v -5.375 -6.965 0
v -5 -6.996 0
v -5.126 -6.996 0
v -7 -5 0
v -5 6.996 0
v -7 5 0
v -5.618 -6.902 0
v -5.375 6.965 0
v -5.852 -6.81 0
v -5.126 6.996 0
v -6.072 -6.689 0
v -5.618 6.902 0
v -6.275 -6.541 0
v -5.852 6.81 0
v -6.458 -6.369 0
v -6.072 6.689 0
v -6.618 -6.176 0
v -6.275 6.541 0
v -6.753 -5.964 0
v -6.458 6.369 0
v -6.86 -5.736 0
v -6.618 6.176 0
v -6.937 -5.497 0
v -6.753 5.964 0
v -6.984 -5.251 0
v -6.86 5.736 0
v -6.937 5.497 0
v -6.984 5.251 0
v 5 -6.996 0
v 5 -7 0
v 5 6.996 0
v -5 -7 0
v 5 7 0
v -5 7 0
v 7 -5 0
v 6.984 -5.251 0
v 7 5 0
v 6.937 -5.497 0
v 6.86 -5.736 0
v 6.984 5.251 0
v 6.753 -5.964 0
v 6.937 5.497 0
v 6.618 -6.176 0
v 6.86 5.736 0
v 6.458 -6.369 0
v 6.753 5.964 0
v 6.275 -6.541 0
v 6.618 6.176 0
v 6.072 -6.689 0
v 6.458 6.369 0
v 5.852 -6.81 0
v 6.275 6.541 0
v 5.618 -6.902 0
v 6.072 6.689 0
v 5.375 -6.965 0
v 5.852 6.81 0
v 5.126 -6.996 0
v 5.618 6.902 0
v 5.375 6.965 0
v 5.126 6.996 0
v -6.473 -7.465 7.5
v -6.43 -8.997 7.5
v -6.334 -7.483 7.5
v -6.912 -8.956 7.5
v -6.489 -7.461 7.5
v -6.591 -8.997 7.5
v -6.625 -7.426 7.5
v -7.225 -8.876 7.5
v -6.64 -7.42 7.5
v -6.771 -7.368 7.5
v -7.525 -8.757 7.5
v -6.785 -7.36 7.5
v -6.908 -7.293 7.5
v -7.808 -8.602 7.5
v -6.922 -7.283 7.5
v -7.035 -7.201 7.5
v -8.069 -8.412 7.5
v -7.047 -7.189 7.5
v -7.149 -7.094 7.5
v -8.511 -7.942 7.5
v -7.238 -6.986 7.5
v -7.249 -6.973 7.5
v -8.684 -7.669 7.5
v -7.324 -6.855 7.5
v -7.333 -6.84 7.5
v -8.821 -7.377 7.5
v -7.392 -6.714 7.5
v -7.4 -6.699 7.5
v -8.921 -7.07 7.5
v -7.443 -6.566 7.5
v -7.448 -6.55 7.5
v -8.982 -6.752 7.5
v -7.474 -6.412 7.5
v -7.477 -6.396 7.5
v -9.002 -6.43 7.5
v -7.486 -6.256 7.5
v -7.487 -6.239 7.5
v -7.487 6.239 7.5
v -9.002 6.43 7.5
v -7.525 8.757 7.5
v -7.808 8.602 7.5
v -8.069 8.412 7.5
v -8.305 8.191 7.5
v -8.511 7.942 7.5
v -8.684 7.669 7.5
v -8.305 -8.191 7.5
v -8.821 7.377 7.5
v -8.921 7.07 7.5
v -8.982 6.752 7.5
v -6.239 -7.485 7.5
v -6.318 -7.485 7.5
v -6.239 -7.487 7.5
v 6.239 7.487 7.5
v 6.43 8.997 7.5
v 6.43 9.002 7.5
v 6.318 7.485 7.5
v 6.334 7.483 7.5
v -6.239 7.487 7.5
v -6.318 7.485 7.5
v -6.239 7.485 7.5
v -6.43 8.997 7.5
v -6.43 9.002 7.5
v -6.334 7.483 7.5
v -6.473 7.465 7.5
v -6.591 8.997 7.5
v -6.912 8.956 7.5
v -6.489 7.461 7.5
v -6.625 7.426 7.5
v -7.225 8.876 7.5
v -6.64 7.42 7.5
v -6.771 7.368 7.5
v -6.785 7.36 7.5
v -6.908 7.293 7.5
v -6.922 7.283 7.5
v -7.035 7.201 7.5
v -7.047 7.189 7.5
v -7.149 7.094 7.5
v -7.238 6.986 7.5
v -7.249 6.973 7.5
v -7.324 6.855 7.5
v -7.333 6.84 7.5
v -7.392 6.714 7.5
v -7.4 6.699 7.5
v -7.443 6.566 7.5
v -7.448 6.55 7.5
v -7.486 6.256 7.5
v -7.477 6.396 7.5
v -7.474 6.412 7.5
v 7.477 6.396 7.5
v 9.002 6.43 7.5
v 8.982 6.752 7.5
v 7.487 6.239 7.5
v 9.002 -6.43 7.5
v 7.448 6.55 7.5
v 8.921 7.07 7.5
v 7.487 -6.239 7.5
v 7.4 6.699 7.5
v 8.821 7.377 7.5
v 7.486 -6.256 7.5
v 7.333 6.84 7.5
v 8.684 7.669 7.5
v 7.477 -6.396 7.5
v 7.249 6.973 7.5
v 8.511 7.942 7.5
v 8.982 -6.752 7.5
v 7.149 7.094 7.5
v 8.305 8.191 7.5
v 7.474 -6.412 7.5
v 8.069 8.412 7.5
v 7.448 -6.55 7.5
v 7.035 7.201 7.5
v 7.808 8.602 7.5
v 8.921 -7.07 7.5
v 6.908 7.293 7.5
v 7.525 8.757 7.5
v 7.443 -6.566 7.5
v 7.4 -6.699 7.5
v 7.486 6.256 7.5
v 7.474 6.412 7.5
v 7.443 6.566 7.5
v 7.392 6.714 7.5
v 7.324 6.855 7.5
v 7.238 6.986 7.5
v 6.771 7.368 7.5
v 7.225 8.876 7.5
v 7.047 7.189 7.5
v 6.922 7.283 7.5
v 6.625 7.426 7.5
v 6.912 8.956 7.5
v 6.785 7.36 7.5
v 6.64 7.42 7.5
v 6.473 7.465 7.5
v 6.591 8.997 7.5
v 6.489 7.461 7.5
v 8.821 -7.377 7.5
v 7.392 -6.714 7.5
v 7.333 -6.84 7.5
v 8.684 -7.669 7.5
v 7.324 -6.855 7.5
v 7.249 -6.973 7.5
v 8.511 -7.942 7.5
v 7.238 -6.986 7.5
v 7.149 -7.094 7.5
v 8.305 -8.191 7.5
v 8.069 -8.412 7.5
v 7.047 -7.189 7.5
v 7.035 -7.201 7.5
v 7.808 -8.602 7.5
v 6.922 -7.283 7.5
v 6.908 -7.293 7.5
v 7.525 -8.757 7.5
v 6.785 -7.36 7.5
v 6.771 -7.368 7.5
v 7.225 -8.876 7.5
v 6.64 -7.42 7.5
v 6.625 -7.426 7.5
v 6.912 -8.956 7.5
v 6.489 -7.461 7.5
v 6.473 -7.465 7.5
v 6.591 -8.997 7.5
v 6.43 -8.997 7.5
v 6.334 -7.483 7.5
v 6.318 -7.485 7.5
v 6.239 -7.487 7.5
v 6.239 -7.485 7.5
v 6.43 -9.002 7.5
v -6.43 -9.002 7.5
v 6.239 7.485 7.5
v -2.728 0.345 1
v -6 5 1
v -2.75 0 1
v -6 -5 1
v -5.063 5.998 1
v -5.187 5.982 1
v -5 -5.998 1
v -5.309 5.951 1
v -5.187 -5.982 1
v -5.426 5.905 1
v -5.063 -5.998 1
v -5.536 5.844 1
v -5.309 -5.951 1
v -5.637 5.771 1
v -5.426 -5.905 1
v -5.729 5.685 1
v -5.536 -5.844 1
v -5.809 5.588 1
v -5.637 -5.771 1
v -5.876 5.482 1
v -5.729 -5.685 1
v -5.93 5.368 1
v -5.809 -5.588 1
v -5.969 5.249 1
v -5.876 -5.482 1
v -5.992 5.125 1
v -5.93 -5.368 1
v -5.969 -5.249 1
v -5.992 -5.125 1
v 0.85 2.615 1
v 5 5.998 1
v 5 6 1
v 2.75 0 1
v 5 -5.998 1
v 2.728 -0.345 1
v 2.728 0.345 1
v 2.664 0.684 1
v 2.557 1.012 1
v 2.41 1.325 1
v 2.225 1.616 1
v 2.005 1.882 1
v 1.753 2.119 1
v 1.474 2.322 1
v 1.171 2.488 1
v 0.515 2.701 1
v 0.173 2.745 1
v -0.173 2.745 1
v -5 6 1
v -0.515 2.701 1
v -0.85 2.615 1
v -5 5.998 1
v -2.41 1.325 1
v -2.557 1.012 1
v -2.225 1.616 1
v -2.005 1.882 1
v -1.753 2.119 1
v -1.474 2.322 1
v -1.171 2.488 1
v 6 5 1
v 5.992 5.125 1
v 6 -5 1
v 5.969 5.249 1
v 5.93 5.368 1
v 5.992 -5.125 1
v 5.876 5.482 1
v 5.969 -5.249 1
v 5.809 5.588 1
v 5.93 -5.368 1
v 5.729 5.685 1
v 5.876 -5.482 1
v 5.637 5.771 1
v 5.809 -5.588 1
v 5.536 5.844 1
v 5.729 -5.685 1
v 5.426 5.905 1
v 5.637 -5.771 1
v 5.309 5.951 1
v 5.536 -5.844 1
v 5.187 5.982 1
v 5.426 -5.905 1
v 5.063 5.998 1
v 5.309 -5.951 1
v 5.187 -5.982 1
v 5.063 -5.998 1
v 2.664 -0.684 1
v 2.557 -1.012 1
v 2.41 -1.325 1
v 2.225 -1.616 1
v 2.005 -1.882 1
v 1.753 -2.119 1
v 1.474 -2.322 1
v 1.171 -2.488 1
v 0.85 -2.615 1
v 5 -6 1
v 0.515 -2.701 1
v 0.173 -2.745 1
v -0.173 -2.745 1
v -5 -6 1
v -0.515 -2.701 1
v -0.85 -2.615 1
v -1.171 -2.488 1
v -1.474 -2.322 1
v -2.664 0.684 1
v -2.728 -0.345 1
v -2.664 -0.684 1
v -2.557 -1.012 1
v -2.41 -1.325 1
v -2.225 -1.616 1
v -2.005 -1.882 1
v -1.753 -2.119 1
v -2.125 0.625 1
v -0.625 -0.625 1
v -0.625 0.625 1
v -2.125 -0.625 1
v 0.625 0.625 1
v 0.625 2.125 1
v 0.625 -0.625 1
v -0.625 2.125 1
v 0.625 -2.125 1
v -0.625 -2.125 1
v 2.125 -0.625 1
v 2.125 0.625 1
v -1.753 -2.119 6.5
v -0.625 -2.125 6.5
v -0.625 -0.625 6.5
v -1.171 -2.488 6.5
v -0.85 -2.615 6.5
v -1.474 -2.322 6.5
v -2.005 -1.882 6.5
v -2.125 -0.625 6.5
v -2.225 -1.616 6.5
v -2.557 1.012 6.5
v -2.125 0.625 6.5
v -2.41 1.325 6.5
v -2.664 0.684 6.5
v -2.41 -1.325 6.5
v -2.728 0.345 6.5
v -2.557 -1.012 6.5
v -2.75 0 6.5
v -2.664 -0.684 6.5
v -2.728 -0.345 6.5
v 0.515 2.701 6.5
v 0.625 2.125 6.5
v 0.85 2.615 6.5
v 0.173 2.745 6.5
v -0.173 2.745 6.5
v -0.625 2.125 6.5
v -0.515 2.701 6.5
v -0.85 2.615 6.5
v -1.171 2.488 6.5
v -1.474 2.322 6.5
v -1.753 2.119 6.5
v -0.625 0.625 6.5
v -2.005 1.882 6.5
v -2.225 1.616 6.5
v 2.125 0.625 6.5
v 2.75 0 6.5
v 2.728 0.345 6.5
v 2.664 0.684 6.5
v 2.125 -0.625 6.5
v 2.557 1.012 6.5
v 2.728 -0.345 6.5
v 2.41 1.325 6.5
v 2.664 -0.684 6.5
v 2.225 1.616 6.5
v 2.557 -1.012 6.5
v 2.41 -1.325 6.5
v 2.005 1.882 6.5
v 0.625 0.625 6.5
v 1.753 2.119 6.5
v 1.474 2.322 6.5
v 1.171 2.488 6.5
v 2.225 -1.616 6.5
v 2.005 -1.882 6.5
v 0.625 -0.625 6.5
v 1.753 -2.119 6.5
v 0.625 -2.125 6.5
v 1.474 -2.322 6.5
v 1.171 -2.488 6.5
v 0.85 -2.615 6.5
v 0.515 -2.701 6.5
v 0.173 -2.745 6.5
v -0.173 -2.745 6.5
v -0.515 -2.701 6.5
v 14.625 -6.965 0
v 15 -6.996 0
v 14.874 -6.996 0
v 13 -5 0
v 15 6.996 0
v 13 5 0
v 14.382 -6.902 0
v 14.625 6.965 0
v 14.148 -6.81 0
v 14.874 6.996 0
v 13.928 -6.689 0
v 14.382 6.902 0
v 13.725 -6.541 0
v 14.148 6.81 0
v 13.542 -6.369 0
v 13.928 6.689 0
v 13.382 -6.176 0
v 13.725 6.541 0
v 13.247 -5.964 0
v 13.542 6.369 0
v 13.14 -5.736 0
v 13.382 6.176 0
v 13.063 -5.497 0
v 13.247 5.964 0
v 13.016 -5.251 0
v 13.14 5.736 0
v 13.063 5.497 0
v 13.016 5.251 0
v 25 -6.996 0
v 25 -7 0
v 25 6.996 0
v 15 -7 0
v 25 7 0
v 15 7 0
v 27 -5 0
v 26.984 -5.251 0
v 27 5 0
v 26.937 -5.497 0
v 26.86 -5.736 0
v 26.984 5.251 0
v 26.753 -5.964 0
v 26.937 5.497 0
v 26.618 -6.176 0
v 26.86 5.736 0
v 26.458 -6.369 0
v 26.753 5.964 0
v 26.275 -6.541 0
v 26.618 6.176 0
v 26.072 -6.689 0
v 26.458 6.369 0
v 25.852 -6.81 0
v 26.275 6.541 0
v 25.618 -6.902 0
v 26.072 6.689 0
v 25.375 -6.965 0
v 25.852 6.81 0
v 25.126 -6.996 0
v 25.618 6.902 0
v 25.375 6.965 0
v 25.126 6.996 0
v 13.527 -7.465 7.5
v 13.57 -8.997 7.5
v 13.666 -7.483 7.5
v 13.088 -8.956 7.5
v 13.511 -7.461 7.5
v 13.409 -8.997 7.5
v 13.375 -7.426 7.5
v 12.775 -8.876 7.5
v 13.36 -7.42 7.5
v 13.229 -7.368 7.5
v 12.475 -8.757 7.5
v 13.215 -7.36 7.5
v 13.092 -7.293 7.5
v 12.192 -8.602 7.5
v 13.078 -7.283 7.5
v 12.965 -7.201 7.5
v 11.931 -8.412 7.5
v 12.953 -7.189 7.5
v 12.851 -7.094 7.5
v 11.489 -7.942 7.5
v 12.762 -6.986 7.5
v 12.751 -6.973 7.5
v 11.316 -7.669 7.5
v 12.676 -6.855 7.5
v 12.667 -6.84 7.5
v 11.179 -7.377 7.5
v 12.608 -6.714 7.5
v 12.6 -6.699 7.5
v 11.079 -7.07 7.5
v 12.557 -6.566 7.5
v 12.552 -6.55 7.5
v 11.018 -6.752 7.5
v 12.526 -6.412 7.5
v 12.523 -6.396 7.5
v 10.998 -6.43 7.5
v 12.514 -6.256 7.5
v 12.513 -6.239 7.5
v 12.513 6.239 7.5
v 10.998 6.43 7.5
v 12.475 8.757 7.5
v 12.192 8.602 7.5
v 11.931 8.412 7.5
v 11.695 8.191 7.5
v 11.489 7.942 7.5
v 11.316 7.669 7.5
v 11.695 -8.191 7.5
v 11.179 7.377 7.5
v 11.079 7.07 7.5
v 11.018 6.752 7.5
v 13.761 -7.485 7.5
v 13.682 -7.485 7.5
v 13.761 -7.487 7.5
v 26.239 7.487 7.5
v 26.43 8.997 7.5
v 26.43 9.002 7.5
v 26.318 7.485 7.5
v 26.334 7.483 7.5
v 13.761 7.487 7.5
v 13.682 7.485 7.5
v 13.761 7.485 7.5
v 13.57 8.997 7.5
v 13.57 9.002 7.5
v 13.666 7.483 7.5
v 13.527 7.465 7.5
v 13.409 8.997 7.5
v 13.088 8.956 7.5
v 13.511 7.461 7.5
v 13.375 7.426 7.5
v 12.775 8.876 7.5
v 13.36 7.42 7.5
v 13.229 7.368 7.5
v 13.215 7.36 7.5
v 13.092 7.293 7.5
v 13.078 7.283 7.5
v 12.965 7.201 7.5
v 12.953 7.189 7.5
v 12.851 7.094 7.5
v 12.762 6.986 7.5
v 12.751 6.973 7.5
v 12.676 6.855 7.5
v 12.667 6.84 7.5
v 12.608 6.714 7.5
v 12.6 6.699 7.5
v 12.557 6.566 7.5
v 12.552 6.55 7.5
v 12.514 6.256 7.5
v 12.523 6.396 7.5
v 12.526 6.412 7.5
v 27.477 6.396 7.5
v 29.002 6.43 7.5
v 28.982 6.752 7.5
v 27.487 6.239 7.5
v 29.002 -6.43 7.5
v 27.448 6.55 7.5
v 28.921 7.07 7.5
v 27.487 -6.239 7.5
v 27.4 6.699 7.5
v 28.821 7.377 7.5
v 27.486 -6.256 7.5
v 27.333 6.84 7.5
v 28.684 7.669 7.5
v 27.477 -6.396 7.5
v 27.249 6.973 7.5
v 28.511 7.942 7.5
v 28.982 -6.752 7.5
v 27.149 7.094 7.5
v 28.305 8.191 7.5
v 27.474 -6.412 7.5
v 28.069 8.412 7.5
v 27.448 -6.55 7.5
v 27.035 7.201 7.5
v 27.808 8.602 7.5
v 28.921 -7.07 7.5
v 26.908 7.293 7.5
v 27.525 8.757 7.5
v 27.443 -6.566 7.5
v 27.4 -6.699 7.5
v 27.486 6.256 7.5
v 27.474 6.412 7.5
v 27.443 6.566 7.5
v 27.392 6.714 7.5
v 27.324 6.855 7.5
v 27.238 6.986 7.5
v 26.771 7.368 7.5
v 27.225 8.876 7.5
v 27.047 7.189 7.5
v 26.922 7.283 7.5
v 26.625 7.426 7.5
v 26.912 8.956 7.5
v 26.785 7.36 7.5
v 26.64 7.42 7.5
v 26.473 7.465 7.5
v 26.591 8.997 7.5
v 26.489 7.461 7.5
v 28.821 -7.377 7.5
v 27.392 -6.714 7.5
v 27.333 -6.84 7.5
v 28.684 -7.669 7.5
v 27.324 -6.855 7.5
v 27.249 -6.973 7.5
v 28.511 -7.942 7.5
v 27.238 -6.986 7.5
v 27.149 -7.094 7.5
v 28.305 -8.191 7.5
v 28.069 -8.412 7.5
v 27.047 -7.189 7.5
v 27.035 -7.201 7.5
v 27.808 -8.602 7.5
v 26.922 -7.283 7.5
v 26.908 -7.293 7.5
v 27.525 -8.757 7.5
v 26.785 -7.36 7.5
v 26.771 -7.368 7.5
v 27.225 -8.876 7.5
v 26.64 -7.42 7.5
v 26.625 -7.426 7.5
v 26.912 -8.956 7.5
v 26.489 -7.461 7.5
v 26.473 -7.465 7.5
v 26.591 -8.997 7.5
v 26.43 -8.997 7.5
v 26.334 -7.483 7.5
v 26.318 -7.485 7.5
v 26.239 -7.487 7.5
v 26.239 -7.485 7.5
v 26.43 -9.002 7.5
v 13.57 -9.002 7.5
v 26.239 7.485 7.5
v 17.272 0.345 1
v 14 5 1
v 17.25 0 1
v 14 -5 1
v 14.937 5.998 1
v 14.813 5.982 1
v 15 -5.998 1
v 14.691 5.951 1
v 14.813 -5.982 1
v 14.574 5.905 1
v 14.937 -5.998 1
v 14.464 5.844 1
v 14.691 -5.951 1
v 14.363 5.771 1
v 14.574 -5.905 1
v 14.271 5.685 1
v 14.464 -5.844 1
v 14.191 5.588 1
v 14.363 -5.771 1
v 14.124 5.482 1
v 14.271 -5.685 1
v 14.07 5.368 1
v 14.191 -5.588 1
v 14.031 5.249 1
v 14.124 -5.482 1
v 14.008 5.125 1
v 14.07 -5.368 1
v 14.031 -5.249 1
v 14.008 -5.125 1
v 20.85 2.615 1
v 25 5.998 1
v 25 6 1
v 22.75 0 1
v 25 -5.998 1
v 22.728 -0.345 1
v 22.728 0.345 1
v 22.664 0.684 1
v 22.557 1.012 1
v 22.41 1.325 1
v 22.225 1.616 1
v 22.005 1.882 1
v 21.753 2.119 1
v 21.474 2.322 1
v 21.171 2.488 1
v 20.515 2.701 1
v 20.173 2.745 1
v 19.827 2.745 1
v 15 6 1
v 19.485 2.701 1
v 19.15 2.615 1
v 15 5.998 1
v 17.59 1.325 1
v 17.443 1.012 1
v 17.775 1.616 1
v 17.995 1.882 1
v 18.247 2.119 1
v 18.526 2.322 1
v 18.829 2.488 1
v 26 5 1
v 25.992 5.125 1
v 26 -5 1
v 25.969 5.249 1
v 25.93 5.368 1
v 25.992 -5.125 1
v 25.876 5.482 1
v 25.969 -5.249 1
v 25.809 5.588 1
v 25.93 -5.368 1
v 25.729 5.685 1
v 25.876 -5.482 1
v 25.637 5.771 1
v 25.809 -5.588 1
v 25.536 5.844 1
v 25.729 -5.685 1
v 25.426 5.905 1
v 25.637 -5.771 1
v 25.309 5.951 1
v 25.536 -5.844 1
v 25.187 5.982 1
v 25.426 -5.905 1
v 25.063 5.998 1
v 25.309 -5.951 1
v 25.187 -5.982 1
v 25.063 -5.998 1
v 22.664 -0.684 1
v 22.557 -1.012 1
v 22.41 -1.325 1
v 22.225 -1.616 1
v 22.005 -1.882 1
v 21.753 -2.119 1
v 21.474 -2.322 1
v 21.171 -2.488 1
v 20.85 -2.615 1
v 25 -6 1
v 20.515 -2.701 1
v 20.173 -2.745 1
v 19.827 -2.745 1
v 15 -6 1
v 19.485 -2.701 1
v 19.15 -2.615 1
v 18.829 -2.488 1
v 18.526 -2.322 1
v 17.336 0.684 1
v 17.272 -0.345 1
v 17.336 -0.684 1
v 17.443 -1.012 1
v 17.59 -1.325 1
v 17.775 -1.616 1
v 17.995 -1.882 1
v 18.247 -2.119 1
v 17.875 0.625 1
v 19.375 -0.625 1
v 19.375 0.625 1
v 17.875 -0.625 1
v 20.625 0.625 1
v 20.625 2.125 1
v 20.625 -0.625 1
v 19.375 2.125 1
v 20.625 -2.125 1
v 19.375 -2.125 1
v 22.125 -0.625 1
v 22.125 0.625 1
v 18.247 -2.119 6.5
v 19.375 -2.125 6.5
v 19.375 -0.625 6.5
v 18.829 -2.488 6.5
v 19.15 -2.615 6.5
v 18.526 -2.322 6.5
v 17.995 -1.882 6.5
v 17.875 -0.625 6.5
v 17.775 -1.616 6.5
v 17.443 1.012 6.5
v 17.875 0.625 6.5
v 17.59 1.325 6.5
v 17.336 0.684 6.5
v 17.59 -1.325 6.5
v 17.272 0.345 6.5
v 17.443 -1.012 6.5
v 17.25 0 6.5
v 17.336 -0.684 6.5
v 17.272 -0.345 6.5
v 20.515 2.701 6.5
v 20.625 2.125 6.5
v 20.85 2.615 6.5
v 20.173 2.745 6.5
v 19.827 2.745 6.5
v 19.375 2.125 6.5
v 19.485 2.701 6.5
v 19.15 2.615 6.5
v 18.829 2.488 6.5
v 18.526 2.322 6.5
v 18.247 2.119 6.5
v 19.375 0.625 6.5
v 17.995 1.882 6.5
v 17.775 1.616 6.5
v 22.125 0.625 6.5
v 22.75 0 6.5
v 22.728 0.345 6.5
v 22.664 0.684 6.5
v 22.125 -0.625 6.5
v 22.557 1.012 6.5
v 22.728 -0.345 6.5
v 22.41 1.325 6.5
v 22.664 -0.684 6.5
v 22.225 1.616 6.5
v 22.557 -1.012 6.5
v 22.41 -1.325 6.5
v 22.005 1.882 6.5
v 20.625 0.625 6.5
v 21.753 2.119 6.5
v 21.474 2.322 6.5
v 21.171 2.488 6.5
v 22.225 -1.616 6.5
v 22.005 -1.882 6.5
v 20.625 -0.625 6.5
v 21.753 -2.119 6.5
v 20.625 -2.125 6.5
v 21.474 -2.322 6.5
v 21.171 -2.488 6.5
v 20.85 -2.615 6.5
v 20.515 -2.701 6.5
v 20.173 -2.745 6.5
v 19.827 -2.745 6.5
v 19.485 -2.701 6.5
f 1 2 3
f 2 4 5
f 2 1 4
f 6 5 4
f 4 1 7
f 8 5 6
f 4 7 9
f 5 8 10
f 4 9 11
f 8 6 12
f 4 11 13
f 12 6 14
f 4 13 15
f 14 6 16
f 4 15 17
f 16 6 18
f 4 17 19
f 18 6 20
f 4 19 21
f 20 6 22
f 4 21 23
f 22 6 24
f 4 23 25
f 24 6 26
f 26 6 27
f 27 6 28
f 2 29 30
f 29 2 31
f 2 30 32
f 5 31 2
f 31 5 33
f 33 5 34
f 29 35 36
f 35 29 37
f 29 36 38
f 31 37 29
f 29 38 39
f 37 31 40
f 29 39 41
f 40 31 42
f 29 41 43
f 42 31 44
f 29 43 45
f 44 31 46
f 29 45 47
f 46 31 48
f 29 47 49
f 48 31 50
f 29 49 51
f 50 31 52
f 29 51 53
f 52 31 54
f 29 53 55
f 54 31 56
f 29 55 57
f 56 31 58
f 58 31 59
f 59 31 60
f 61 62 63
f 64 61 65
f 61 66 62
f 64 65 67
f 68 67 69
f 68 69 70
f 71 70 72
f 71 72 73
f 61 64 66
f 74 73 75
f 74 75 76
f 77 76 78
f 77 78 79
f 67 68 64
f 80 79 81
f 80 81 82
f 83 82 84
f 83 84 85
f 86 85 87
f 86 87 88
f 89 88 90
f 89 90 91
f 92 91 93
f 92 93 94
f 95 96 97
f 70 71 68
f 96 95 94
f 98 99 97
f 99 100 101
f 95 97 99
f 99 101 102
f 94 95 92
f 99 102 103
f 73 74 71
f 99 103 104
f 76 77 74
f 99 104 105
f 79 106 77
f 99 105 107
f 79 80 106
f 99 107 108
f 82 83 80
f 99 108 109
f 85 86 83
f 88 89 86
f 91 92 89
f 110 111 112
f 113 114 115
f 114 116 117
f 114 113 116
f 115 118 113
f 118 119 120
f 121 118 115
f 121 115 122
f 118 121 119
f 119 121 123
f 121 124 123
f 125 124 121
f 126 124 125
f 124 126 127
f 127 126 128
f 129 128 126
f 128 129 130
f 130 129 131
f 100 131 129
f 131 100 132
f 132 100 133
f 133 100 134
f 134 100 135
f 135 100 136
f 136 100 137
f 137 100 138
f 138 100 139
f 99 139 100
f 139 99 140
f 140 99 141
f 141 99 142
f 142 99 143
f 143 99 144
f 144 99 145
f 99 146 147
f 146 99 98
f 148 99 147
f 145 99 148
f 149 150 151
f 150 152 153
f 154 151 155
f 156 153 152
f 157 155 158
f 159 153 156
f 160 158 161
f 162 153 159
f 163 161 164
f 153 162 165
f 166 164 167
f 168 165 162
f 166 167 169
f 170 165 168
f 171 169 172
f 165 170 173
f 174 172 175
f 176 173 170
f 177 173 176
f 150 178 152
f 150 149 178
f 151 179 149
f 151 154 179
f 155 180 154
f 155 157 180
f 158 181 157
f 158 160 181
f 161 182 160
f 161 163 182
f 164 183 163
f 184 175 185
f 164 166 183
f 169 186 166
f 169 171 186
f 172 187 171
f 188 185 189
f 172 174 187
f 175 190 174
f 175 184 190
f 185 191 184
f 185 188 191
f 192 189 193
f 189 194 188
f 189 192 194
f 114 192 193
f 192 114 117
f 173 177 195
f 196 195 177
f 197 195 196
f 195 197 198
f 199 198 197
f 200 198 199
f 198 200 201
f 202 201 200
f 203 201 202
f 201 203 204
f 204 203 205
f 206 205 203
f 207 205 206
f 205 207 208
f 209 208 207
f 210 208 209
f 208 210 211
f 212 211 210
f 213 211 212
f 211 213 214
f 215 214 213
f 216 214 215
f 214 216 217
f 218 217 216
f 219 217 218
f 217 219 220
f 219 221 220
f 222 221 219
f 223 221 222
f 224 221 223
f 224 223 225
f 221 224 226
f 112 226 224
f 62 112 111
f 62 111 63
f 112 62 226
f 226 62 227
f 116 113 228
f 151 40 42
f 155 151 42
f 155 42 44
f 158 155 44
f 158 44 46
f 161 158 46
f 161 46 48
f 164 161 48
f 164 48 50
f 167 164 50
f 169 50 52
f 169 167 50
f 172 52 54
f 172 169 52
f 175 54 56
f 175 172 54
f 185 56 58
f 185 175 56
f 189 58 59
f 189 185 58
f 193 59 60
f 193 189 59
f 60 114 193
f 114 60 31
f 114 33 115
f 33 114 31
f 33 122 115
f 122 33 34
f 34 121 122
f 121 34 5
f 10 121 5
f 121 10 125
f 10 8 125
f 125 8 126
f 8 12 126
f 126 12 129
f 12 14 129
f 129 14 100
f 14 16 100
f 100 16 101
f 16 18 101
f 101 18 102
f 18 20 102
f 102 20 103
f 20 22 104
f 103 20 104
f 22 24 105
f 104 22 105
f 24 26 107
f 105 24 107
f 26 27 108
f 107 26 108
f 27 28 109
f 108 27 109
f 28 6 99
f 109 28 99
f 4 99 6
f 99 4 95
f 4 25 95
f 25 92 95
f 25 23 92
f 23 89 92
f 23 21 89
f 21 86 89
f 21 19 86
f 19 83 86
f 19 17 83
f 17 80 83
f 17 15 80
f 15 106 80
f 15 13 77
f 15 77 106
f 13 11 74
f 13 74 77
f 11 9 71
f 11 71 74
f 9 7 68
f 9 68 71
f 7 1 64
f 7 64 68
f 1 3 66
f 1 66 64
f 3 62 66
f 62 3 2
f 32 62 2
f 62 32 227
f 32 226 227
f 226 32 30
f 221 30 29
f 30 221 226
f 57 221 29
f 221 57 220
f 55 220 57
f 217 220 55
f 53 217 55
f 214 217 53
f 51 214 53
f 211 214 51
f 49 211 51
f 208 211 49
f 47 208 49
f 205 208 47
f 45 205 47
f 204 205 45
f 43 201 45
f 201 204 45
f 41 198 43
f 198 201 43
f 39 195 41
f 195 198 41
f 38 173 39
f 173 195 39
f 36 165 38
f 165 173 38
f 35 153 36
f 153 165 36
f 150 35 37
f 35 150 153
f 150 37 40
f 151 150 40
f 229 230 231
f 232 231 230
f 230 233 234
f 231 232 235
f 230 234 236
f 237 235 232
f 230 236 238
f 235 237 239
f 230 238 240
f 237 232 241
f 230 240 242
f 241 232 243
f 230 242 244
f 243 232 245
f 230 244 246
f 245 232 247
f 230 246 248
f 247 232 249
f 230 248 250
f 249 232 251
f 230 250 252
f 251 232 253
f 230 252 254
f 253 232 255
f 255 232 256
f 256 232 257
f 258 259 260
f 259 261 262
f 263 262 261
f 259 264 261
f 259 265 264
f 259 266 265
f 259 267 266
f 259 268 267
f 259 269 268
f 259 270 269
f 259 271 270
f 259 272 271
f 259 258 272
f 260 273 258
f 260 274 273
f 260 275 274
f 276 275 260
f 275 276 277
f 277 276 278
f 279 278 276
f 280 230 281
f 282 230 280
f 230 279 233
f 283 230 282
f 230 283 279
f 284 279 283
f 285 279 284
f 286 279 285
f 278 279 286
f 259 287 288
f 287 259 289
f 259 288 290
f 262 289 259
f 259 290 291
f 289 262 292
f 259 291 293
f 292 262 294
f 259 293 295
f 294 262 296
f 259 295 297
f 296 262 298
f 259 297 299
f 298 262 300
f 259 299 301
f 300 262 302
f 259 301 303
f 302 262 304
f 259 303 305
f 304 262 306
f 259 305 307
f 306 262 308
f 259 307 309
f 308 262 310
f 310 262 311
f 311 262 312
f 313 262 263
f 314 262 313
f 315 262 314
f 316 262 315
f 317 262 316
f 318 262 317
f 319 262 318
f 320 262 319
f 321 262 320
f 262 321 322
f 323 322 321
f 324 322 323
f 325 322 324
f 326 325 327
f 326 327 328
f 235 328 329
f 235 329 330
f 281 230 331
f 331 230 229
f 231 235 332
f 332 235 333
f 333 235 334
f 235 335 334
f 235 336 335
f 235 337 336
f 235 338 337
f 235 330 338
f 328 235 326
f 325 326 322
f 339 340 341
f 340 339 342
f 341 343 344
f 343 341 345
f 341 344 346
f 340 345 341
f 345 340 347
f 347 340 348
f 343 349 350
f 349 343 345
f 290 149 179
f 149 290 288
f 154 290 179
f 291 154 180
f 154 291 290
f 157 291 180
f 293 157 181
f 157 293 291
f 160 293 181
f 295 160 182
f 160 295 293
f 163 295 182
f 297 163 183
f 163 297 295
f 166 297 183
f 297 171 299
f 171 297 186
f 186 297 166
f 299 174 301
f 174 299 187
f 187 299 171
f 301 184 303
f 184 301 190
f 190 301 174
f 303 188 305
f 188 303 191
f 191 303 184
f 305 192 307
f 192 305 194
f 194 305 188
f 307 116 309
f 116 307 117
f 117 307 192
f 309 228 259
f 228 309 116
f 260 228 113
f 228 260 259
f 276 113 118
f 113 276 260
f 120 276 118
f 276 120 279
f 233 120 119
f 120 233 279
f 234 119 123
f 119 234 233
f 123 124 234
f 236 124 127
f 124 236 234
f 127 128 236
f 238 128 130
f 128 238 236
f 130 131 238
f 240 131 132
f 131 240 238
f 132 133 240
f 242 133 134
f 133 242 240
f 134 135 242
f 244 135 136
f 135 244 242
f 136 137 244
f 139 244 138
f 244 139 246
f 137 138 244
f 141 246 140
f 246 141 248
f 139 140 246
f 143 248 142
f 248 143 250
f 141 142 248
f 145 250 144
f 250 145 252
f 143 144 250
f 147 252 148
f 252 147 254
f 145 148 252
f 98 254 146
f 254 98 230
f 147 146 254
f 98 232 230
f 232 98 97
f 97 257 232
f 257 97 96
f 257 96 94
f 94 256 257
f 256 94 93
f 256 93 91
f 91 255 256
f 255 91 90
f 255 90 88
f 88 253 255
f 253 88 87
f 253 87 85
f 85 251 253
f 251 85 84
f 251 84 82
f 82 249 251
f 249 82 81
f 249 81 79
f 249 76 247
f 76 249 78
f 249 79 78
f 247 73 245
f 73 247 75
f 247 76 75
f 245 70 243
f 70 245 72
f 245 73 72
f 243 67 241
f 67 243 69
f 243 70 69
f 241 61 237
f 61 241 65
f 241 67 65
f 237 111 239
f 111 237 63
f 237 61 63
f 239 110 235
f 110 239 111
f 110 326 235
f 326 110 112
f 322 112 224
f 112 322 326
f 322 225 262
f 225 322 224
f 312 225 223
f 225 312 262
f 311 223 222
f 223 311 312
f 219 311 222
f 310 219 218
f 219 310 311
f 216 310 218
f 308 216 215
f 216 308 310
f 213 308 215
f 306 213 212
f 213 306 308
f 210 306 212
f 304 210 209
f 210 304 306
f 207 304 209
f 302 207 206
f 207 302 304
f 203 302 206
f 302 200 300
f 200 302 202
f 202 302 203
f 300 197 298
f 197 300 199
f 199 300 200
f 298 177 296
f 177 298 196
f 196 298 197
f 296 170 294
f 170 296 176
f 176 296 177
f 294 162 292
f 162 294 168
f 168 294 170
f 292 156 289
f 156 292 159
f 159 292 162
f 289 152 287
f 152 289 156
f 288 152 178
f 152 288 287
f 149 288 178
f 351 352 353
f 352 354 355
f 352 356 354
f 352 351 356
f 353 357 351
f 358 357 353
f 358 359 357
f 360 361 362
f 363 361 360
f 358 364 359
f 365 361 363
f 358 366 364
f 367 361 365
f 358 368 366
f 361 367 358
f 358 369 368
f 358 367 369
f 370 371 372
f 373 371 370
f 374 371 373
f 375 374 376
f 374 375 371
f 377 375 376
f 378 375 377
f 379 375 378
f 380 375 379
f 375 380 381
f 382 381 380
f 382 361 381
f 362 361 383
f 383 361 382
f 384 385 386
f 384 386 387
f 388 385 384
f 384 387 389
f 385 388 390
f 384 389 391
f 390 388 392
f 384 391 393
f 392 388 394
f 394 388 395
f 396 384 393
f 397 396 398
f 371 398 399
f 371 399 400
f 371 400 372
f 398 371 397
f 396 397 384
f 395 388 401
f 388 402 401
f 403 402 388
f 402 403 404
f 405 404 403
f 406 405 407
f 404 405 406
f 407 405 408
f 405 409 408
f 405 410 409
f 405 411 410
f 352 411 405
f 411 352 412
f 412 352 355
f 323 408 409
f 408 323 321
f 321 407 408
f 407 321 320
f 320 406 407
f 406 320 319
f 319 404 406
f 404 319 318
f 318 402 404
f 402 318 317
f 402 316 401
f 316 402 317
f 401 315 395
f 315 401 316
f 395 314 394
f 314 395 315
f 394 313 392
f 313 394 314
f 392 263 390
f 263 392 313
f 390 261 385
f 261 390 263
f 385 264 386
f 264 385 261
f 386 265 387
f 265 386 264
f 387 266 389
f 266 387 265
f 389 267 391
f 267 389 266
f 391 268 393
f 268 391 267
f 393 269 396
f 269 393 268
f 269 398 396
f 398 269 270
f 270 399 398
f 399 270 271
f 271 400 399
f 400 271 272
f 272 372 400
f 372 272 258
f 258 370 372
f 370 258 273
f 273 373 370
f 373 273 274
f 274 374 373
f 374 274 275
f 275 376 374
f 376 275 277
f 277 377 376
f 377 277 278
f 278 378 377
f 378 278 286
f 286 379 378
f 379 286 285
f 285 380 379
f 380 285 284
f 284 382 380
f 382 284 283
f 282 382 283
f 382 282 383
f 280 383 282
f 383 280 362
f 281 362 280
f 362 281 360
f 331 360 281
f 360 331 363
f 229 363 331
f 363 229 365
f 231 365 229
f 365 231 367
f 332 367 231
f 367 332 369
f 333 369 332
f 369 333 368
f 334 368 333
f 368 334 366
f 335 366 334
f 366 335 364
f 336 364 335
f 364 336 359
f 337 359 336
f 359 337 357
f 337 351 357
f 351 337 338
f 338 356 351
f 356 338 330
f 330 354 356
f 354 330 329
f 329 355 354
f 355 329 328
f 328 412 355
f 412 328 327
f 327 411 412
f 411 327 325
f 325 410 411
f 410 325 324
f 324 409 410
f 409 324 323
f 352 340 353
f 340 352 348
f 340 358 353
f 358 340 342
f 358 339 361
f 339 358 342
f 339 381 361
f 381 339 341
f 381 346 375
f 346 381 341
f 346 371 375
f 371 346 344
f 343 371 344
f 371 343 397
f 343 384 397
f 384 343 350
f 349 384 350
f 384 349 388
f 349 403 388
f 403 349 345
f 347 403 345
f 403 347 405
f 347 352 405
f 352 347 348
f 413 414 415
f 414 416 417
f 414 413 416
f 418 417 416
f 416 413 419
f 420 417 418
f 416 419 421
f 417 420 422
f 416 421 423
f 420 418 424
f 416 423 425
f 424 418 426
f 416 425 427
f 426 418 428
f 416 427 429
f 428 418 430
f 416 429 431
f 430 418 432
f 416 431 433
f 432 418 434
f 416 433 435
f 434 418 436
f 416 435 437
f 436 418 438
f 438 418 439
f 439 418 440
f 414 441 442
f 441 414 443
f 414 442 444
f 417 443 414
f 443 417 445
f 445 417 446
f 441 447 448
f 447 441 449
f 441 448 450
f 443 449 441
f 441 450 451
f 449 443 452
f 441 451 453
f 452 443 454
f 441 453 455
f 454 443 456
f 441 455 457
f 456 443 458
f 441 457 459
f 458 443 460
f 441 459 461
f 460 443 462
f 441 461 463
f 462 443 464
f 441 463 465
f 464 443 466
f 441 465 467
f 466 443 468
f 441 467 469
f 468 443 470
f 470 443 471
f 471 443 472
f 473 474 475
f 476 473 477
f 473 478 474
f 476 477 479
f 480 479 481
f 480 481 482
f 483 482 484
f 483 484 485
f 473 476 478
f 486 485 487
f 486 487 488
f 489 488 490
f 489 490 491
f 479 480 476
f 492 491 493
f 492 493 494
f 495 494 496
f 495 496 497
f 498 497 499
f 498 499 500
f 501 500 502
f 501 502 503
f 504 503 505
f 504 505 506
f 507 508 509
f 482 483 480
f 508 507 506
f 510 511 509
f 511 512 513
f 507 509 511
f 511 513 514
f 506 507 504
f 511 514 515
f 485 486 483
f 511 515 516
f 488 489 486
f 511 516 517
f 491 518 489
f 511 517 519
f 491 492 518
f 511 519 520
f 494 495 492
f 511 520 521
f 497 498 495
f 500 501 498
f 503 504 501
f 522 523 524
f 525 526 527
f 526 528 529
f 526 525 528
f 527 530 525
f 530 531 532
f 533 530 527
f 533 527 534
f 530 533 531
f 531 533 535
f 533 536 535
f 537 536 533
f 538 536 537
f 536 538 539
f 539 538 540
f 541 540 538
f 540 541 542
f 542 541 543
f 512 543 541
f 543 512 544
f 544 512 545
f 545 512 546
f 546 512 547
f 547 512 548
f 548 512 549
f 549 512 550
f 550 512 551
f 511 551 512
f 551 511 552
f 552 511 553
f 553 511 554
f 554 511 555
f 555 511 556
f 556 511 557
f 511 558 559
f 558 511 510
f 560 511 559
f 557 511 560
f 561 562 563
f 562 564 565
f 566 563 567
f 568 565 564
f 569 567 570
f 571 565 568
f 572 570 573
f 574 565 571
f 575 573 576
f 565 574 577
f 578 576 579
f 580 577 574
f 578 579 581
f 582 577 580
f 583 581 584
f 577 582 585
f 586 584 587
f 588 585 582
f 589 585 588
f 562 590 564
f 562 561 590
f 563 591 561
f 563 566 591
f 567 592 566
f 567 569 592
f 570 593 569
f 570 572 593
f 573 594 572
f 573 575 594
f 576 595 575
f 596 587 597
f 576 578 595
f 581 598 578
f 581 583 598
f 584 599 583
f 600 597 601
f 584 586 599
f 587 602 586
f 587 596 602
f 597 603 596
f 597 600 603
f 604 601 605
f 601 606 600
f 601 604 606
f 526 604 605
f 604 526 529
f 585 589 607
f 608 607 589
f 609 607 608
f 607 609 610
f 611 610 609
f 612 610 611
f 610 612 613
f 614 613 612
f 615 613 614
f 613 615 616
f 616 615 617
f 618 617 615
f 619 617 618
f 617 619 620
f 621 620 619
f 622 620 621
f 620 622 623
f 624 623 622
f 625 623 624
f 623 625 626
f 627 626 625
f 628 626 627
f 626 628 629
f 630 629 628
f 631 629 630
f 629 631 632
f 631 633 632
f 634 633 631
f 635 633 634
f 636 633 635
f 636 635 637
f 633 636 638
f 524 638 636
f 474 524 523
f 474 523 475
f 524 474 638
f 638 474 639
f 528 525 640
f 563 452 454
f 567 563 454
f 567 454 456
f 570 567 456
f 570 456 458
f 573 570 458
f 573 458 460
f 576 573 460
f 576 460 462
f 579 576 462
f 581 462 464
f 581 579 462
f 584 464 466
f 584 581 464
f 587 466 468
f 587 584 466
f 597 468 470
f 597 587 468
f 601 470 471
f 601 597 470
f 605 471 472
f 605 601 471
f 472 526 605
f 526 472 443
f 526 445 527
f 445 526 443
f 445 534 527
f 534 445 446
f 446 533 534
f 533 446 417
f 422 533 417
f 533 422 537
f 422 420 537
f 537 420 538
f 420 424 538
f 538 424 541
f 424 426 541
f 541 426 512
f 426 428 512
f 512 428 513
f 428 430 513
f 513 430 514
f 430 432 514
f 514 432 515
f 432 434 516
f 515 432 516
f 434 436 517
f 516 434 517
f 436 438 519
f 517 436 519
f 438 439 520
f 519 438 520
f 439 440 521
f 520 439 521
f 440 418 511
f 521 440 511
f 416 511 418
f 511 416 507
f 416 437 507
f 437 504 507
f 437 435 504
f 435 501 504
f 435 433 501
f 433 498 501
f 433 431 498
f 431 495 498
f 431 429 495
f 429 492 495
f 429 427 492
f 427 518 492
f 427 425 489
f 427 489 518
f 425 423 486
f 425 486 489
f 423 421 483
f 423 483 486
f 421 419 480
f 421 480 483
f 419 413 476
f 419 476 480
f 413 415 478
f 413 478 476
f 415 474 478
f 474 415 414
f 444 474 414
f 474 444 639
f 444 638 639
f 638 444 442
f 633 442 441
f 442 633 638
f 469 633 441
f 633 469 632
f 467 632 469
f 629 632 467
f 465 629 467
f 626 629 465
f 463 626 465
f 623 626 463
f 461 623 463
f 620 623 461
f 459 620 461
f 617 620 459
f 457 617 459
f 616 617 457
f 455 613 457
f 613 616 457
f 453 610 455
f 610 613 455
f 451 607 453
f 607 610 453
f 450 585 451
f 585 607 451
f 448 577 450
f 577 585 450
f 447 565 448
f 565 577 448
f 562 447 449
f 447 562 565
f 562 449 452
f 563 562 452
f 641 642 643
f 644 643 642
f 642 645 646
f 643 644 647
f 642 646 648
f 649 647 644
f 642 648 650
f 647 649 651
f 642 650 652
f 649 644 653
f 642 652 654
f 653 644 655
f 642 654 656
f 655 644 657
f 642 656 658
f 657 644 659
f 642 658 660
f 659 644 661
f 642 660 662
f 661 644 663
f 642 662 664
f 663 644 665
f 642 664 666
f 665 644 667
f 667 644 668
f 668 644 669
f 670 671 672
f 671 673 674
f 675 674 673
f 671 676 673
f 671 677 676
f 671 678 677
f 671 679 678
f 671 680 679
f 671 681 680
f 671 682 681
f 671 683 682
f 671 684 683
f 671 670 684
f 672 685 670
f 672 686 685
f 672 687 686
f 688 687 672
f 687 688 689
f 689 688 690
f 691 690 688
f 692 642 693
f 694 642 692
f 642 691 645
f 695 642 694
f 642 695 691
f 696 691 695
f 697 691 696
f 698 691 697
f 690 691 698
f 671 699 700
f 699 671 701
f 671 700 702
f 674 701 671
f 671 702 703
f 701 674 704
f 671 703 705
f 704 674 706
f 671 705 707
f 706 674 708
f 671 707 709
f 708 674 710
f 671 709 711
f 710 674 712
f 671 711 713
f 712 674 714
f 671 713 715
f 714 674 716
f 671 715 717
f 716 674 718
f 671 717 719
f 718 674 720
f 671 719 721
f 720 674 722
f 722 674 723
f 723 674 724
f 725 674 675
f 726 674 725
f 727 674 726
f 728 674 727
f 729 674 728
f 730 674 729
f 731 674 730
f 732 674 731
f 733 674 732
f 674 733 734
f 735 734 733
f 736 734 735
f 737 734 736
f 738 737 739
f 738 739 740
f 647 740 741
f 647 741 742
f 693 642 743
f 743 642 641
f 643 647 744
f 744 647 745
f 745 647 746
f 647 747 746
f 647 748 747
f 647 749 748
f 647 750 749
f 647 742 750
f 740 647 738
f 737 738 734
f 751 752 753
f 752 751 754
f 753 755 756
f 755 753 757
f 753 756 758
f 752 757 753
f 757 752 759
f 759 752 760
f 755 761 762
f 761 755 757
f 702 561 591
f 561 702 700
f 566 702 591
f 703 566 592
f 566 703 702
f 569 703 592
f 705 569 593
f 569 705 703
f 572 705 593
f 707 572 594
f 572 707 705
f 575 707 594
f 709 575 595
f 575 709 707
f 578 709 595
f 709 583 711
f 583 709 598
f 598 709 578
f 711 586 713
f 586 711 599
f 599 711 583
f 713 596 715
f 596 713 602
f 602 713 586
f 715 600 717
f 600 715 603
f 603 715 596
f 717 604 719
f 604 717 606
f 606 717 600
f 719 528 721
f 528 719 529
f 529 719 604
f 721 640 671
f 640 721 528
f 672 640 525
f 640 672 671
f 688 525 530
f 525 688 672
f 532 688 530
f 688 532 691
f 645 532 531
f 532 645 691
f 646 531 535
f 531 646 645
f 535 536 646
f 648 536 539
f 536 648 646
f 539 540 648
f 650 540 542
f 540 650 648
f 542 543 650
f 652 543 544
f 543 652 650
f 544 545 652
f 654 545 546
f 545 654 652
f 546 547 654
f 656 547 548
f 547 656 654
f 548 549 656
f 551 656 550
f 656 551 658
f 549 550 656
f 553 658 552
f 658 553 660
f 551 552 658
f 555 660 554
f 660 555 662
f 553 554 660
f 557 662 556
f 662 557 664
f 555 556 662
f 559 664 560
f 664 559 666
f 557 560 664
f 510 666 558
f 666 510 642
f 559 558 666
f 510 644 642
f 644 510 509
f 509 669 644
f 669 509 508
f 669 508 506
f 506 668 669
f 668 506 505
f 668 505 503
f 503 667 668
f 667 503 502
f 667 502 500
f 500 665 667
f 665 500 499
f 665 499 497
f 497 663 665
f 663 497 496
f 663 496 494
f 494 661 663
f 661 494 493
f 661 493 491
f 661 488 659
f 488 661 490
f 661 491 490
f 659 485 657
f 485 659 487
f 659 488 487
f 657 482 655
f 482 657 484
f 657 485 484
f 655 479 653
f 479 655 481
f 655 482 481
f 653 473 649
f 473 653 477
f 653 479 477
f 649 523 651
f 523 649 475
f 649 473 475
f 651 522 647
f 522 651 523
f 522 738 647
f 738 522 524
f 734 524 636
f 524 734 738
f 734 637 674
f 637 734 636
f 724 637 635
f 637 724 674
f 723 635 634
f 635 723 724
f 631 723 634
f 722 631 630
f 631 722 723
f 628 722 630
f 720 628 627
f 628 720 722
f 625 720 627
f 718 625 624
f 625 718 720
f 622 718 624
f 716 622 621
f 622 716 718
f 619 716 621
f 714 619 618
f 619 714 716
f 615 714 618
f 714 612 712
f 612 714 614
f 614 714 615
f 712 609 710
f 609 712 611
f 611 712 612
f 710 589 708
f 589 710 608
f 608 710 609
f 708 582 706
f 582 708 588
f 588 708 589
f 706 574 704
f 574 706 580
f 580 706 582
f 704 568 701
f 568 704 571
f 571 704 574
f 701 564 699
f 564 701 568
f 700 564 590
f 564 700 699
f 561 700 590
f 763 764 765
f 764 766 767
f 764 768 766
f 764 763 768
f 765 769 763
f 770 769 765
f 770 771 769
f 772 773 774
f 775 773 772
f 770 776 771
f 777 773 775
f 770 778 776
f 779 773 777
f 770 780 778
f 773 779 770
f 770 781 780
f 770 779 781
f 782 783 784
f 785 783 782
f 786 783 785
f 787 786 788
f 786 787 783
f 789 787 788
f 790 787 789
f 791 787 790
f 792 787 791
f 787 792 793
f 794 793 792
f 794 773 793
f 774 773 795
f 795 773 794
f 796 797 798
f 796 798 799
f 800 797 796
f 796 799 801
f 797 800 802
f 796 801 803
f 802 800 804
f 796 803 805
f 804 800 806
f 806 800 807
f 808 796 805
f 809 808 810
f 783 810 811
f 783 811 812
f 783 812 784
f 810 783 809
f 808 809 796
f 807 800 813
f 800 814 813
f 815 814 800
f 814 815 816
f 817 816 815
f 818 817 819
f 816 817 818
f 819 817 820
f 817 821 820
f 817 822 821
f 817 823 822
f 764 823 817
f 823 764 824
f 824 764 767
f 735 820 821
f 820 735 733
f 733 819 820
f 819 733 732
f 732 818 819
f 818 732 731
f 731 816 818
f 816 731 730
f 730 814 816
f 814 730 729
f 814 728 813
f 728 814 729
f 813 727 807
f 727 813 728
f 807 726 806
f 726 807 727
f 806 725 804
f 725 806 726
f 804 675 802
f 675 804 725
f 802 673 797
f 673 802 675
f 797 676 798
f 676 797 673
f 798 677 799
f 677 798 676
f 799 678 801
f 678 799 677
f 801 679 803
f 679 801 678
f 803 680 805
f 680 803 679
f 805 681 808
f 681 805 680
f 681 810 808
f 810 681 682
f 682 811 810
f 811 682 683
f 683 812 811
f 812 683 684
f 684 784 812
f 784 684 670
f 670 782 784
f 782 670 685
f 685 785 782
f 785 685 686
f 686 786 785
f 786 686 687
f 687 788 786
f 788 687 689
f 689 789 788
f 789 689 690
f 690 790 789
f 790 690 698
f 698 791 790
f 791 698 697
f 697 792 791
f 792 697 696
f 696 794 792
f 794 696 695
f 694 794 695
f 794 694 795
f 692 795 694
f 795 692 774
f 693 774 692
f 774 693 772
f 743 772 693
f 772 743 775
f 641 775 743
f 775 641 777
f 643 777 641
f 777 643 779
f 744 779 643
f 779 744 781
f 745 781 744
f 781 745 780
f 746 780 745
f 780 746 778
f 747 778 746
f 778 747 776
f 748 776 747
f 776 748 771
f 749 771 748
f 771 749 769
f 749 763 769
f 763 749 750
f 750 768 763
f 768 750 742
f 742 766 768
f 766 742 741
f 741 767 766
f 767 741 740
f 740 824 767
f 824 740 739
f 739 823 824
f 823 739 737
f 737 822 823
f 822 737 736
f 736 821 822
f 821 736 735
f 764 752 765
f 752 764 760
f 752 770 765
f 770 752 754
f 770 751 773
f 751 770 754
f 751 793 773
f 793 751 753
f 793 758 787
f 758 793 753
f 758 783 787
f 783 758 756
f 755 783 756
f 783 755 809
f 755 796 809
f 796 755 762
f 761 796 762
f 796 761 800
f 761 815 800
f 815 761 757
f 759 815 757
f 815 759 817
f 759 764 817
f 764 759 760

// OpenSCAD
// Icon keycaps for the stream deck: Discord full mute (deafen) and Print Screen.
//
// Based on the emoji keycap generator by Benoit Perocheau
// (Designed by Benoit Perocheau,
//  License: CC-Attribution-Noncommercial-Share Alike).
// This file is a derivative and keeps that license (CC BY-NC-SA), not the
// MIT license of the rest of the repository.
//
// Changes from the original:
//  - the keycap is one module instead of nine copied blocks
//  - the emoji text is replaced by icons drawn as geometry, because emoji
//    fonts have neither a Discord deafen icon nor a screenshot icon
//  - choose which part to export, so the icon can be printed in a second
//    colour (inlay) or simply engraved for a single-colour print
//
// The keycap is printed top-down: the top face lies on the bed and the icon
// is mirrored so it reads correctly when the cap is turned over.
//
// Export from the command line, for example:
//   openscad -D 'Icon="deafen"' -D 'Part="body"' -o deafen_body.stl icon_keycaps.scad
//   openscad -D 'Icon="deafen"' -D 'Part="icon"' -o deafen_icon.stl icon_keycaps.scad

/* [Keycap] */
// Which icon: "deafen" (Discord full mute), "printscreen", or "both" side by side
Icon = "both"; // [both, deafen, printscreen]
// "inlay": icon in a second colour, flush with the top. "engrave": icon cut
// into the top, one colour.
Style = "inlay"; // [inlay, engrave]
// "all" for a preview; export "body" and "icon" separately for a two-colour print
Part = "all"; // [all, body, icon]
//DSA=7mm; XDA=9mm
Keycap_Height = 7.5;
// Width of the icon on the 14 mm top face
Icon_Size = 11;
// Inlay thickness (use a multiple of your layer height)
Icon_Depth = 0.4;
// Engrave depth
Engrave_Depth = 0.6;

/* [Colors] */
Keycap_Color = "#ffffff";
Icon_Color = "#d83c3e";

// ---------------------------------------------------------------------------
// Keycap shape (from the original generator)
// ---------------------------------------------------------------------------
module rounded_outline(size, corner) {
  // square with quarter-circle corners cut in, as in the original
  difference() {
    square(size, center = true);
    for (sx = [-1, 1], sy = [-1, 1])
      translate([sx * (size / 2 - corner), sy * (size / 2 - corner)])
        difference() {
          translate([sx * corner / 2, sy * corner / 2]) square(corner, center = true);
          circle(r = corner, $fn = 50);
        }
  }
}

module keycap_body() {
  union() {
    difference() {
      // outside: 14 mm top growing to 18 mm at the skirt
      linear_extrude(height = Keycap_Height, center = false, scale = 1.286)
        rounded_outline(14, 2);
      // hollow inside, 1 mm top thickness
      translate([0, 0, 1])
        linear_extrude(height = Keycap_Height, center = false, scale = 1.286)
          rounded_outline(12, 1);
    }
    // MX stem socket
    linear_extrude(height = Keycap_Height - 1, center = false)
      difference() {
        circle(d = 5.5, $fn = 50);
        square([1.25, 4.25], center = true);
        square([4.25, 1.25], center = true);
      }
  }
}

// ---------------------------------------------------------------------------
// Icons, drawn on a 24 x 24 grid (2-unit strokes) and scaled to Icon_Size.
// ---------------------------------------------------------------------------
// Removes slivers thinner than 2*d that cut-outs can leave behind (they are
// too thin to print); full 2-unit strokes are kept.
module drop_slivers(d = 0.6) {
  offset(r = d, $fn = 24) offset(r = -d, $fn = 24) children();
}

module stroke_line(a, b, w) {
  hull() {
    translate(a) circle(d = w, $fn = 24);
    translate(b) circle(d = w, $fn = 24);
  }
}

module rounded_rect(x0, y0, x1, y1, r) {
  translate([x0 + r, y0 + r]) offset(r = r, $fn = 32) square([x1 - x0 - 2 * r, y1 - y0 - 2 * r]);
}

// Discord "deafen": headphones with a slash from bottom left to top right.
module icon_deafen() {
  slash_a = [3.2, 2.2];
  slash_b = [21.2, 21.6];
  slash_y = function(x) slash_a[1] + (x - slash_a[0]) * (slash_b[1] - slash_a[1]) / (slash_b[0] - slash_a[0]);
  drop_slivers() difference() {
    union() {
      // headband: upper part of a ring
      intersection() {
        translate([12, 11]) difference() {
          circle(r = 9.2, $fn = 96);
          circle(r = 7.2, $fn = 96);
        }
        translate([0, 9]) square([24, 15]);
      }
      // ear cups
      rounded_rect(2.8, 2.5, 8.6, 11.5, 2);
      rounded_rect(15.4, 2.5, 21.2, 11.5, 2);
    }
    // gap around the slash
    stroke_line(slash_a, slash_b, 5.2);
    // the part of the left ear cup below the slash goes, as in Discord's icon
    polygon([[-1, -1], [12, -1], [12, slash_y(12)], [-1, slash_y(-1)]]);
  }
  stroke_line(slash_a, slash_b, 2);
}

// Print Screen: dashed frame with a camera in the lower right corner.
module camera_outline() {
  difference() {
    camera_fill();
    offset(delta = -2) camera_fill();
  }
  // lens ring
  translate([15.2, 6.6]) difference() {
    circle(r = 3, $fn = 64);
    circle(r = 1.1, $fn = 48);
  }
}

module camera_fill() {
  union() {
    rounded_rect(8.6, 1.8, 22, 12.6, 2.2);
    // viewfinder bump on top
    polygon([[11.4, 12], [13.6, 15.2], [17, 15.2], [19.2, 12]]);
  }
}

module icon_printscreen() {
  // frame: rounded square stroke, kept only at the corners and two dashes
  // per side, and cut away around the camera
  drop_slivers() difference() {
    intersection() {
      difference() {
        rounded_rect(2, 2, 22, 22, 4);
        rounded_rect(4, 4, 20, 20, 2);
      }
      union() {
        for (x = [0, 17.5], y = [0, 17.5]) translate([x, y]) square(6.5);
        for (p = [8.6, 13.4]) {
          translate([p, 0]) square([2.4, 24]);  // dashes on top and bottom
          translate([0, p]) square([24, 2.4]);  // dashes on left and right
        }
      }
    }
    offset(r = 1.6) camera_fill();
  }
  camera_outline();
}

module icon_2d(name) {
  s = Icon_Size / 24;
  // centred on the keycap, mirrored because the cap prints top-down
  mirror([1, 0, 0]) scale([s, s]) translate([-12, -12]) {
    if (name == "deafen") icon_deafen();
    else if (name == "printscreen") icon_printscreen();
  }
}

// ---------------------------------------------------------------------------
// One finished keycap
// ---------------------------------------------------------------------------
module icon_keycap(name) {
  depth = Style == "inlay" ? Icon_Depth : Engrave_Depth;
  if (Part == "all" || Part == "body")
    color(Keycap_Color) difference() {
      keycap_body();
      translate([0, 0, -0.2]) linear_extrude(depth + 0.2) icon_2d(name);
    }
  if (Style == "inlay" && (Part == "all" || Part == "icon"))
    color(Icon_Color) linear_extrude(depth) icon_2d(name);
}

if (Icon == "both") {
  icon_keycap("deafen");
  translate([20, 0, 0]) icon_keycap("printscreen");
} else {
  icon_keycap(Icon);
}
